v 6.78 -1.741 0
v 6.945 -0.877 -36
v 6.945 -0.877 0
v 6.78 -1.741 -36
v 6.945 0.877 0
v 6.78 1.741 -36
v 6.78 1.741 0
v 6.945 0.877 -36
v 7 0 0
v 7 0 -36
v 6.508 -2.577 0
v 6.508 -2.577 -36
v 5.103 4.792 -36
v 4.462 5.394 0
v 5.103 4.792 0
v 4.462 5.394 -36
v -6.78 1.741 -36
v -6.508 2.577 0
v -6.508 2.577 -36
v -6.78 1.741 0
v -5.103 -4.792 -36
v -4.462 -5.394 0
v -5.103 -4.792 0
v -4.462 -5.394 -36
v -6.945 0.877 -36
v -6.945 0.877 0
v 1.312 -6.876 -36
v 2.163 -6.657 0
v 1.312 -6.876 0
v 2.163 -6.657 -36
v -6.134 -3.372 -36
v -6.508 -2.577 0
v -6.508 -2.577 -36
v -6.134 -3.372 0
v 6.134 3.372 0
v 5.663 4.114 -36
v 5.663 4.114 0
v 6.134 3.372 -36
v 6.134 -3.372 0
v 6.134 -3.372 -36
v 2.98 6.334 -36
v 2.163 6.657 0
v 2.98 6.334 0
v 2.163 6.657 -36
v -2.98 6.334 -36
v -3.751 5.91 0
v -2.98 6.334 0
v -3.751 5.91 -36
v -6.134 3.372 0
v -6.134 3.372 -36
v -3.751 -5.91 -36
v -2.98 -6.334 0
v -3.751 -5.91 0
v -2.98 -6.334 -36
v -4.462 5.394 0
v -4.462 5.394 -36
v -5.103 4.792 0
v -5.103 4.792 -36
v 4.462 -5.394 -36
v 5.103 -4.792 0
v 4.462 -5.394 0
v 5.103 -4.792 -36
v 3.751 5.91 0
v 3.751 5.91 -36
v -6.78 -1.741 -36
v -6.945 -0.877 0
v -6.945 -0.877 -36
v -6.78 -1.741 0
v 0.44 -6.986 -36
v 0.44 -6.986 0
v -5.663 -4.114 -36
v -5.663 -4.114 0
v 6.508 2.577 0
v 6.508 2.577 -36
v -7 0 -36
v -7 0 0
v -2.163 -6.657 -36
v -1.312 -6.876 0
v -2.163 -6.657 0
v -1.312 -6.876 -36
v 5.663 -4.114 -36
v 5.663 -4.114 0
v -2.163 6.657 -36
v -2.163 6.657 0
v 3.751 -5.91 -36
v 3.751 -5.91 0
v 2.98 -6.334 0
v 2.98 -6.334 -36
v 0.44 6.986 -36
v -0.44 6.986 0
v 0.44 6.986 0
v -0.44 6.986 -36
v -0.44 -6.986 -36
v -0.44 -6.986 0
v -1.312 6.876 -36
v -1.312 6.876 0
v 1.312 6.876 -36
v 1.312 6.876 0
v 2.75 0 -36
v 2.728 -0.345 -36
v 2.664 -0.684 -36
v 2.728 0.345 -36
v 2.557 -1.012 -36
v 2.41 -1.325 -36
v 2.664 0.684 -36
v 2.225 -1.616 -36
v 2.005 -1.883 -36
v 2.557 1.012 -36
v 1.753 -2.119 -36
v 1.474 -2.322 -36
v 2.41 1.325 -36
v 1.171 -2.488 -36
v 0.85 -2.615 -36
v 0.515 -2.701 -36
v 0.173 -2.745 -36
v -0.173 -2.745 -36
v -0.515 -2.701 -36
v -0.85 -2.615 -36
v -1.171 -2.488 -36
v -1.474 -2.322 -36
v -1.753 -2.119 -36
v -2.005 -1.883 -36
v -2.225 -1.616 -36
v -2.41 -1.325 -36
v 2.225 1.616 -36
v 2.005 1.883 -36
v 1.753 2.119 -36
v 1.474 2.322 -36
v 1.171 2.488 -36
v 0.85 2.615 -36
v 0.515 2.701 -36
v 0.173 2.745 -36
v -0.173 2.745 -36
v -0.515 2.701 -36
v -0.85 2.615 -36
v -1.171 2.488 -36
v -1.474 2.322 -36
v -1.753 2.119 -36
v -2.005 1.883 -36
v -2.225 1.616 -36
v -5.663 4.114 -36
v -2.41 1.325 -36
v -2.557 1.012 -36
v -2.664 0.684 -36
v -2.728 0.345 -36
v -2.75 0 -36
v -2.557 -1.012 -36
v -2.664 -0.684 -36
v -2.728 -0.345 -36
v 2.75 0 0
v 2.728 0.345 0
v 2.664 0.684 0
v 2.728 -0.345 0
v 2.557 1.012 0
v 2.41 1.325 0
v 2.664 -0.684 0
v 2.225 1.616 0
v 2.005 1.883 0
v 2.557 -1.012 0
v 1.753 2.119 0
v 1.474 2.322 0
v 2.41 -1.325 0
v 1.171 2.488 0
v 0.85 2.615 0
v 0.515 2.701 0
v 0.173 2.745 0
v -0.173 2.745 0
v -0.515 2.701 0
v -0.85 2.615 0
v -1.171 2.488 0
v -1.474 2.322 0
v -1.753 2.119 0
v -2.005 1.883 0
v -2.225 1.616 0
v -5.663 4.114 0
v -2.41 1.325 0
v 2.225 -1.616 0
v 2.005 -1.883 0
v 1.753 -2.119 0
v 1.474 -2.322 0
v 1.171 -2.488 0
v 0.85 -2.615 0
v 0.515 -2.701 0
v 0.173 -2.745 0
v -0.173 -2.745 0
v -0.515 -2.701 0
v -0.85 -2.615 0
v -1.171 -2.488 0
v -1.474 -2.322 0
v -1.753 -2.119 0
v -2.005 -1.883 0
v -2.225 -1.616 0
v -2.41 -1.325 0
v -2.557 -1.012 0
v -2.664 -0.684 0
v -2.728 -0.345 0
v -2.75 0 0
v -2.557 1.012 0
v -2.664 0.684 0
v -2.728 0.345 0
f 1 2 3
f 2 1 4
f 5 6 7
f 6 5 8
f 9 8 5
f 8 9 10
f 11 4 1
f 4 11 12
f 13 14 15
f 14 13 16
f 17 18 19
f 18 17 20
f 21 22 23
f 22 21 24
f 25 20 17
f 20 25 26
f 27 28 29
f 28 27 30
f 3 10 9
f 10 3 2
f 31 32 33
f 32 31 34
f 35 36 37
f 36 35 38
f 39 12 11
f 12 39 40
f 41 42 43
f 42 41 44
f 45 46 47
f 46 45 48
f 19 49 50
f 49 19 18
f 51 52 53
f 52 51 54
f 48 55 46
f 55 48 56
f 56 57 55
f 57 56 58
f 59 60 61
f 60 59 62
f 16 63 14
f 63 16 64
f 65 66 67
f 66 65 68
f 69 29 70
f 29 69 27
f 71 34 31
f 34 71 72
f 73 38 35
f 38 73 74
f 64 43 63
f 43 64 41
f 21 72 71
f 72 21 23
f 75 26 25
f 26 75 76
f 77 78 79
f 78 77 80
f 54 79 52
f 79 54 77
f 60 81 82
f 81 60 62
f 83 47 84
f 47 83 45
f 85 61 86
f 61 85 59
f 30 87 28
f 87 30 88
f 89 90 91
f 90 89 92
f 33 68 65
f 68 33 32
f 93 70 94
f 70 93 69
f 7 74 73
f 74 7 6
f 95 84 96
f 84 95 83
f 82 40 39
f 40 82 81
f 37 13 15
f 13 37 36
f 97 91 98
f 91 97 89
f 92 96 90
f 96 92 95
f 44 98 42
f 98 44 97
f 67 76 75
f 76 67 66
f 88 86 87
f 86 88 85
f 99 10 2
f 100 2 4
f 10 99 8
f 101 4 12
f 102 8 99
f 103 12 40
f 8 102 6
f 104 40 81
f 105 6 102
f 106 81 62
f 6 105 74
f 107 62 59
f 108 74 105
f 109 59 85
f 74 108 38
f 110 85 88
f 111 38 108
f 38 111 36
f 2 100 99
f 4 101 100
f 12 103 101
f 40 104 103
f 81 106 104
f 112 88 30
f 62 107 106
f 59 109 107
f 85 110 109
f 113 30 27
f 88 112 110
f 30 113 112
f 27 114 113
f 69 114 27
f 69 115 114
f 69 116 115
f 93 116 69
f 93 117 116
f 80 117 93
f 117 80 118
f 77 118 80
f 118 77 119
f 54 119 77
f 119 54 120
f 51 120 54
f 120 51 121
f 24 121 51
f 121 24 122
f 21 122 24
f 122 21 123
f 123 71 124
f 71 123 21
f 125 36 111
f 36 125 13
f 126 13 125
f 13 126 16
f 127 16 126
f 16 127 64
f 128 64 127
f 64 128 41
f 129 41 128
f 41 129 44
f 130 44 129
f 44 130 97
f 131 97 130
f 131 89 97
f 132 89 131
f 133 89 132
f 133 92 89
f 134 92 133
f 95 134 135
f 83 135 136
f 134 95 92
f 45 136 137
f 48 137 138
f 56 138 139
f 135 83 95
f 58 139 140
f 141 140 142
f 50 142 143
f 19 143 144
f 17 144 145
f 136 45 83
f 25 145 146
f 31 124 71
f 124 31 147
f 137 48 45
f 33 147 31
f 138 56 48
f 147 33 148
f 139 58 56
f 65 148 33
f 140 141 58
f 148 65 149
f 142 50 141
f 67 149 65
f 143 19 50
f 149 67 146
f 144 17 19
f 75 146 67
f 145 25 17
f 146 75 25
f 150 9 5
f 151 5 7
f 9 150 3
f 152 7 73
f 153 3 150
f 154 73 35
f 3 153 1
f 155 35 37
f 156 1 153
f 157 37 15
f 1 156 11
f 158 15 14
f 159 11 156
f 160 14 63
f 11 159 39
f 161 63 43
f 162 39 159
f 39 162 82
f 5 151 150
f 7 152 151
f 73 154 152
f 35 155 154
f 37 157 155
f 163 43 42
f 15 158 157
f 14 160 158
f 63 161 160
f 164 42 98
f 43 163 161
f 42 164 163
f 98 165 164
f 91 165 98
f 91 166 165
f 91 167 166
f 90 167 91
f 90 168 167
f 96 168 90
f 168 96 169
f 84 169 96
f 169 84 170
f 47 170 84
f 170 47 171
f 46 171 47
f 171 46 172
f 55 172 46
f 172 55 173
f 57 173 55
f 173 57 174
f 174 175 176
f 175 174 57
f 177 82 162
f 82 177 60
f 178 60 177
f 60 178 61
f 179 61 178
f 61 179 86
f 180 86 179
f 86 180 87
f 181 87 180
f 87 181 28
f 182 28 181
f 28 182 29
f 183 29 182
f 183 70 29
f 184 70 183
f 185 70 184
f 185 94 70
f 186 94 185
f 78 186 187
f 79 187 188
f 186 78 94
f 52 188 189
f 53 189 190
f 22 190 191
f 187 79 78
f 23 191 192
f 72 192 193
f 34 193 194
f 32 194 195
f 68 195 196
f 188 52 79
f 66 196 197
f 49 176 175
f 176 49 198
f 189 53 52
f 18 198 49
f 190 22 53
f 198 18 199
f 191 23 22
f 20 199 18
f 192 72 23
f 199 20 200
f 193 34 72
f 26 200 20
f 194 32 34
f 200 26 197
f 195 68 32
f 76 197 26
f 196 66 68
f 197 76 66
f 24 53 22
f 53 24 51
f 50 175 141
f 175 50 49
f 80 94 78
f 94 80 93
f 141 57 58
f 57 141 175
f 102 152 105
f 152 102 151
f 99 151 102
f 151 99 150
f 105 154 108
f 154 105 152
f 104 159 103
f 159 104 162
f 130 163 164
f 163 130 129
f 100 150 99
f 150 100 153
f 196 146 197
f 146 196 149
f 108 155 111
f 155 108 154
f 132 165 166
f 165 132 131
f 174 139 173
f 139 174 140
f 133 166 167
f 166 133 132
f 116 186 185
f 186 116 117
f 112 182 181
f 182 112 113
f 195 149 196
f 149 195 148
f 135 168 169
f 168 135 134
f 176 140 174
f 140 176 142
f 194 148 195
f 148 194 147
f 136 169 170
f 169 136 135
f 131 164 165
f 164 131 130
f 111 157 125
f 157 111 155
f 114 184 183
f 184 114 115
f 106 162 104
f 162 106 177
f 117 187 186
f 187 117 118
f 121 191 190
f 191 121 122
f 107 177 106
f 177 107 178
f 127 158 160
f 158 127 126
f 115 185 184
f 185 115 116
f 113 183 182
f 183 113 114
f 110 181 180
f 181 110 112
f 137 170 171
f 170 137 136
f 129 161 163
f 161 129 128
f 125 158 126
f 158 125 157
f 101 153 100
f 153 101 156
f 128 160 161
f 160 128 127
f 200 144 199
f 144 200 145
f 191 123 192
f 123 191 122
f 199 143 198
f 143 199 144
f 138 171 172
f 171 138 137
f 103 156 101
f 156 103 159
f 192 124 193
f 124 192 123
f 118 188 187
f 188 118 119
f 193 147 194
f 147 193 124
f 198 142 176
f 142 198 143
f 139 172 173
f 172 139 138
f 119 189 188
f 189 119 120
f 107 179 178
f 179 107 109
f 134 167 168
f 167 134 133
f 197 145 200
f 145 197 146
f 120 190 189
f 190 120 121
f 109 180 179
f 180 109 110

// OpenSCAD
$fn = 50;


difference() {
	union() {
		translate(v = [0, 0, -36.0000000000]) {
			cylinder(h = 36, r = 7.0000000000);
		}
		cylinder(h = 0, r = 16.0000000000);
	}
	union() {
		#translate(v = [0, 0, -36]) {
			cylinder(h = 36, r = 2.7500000000);
		}
	}
}
